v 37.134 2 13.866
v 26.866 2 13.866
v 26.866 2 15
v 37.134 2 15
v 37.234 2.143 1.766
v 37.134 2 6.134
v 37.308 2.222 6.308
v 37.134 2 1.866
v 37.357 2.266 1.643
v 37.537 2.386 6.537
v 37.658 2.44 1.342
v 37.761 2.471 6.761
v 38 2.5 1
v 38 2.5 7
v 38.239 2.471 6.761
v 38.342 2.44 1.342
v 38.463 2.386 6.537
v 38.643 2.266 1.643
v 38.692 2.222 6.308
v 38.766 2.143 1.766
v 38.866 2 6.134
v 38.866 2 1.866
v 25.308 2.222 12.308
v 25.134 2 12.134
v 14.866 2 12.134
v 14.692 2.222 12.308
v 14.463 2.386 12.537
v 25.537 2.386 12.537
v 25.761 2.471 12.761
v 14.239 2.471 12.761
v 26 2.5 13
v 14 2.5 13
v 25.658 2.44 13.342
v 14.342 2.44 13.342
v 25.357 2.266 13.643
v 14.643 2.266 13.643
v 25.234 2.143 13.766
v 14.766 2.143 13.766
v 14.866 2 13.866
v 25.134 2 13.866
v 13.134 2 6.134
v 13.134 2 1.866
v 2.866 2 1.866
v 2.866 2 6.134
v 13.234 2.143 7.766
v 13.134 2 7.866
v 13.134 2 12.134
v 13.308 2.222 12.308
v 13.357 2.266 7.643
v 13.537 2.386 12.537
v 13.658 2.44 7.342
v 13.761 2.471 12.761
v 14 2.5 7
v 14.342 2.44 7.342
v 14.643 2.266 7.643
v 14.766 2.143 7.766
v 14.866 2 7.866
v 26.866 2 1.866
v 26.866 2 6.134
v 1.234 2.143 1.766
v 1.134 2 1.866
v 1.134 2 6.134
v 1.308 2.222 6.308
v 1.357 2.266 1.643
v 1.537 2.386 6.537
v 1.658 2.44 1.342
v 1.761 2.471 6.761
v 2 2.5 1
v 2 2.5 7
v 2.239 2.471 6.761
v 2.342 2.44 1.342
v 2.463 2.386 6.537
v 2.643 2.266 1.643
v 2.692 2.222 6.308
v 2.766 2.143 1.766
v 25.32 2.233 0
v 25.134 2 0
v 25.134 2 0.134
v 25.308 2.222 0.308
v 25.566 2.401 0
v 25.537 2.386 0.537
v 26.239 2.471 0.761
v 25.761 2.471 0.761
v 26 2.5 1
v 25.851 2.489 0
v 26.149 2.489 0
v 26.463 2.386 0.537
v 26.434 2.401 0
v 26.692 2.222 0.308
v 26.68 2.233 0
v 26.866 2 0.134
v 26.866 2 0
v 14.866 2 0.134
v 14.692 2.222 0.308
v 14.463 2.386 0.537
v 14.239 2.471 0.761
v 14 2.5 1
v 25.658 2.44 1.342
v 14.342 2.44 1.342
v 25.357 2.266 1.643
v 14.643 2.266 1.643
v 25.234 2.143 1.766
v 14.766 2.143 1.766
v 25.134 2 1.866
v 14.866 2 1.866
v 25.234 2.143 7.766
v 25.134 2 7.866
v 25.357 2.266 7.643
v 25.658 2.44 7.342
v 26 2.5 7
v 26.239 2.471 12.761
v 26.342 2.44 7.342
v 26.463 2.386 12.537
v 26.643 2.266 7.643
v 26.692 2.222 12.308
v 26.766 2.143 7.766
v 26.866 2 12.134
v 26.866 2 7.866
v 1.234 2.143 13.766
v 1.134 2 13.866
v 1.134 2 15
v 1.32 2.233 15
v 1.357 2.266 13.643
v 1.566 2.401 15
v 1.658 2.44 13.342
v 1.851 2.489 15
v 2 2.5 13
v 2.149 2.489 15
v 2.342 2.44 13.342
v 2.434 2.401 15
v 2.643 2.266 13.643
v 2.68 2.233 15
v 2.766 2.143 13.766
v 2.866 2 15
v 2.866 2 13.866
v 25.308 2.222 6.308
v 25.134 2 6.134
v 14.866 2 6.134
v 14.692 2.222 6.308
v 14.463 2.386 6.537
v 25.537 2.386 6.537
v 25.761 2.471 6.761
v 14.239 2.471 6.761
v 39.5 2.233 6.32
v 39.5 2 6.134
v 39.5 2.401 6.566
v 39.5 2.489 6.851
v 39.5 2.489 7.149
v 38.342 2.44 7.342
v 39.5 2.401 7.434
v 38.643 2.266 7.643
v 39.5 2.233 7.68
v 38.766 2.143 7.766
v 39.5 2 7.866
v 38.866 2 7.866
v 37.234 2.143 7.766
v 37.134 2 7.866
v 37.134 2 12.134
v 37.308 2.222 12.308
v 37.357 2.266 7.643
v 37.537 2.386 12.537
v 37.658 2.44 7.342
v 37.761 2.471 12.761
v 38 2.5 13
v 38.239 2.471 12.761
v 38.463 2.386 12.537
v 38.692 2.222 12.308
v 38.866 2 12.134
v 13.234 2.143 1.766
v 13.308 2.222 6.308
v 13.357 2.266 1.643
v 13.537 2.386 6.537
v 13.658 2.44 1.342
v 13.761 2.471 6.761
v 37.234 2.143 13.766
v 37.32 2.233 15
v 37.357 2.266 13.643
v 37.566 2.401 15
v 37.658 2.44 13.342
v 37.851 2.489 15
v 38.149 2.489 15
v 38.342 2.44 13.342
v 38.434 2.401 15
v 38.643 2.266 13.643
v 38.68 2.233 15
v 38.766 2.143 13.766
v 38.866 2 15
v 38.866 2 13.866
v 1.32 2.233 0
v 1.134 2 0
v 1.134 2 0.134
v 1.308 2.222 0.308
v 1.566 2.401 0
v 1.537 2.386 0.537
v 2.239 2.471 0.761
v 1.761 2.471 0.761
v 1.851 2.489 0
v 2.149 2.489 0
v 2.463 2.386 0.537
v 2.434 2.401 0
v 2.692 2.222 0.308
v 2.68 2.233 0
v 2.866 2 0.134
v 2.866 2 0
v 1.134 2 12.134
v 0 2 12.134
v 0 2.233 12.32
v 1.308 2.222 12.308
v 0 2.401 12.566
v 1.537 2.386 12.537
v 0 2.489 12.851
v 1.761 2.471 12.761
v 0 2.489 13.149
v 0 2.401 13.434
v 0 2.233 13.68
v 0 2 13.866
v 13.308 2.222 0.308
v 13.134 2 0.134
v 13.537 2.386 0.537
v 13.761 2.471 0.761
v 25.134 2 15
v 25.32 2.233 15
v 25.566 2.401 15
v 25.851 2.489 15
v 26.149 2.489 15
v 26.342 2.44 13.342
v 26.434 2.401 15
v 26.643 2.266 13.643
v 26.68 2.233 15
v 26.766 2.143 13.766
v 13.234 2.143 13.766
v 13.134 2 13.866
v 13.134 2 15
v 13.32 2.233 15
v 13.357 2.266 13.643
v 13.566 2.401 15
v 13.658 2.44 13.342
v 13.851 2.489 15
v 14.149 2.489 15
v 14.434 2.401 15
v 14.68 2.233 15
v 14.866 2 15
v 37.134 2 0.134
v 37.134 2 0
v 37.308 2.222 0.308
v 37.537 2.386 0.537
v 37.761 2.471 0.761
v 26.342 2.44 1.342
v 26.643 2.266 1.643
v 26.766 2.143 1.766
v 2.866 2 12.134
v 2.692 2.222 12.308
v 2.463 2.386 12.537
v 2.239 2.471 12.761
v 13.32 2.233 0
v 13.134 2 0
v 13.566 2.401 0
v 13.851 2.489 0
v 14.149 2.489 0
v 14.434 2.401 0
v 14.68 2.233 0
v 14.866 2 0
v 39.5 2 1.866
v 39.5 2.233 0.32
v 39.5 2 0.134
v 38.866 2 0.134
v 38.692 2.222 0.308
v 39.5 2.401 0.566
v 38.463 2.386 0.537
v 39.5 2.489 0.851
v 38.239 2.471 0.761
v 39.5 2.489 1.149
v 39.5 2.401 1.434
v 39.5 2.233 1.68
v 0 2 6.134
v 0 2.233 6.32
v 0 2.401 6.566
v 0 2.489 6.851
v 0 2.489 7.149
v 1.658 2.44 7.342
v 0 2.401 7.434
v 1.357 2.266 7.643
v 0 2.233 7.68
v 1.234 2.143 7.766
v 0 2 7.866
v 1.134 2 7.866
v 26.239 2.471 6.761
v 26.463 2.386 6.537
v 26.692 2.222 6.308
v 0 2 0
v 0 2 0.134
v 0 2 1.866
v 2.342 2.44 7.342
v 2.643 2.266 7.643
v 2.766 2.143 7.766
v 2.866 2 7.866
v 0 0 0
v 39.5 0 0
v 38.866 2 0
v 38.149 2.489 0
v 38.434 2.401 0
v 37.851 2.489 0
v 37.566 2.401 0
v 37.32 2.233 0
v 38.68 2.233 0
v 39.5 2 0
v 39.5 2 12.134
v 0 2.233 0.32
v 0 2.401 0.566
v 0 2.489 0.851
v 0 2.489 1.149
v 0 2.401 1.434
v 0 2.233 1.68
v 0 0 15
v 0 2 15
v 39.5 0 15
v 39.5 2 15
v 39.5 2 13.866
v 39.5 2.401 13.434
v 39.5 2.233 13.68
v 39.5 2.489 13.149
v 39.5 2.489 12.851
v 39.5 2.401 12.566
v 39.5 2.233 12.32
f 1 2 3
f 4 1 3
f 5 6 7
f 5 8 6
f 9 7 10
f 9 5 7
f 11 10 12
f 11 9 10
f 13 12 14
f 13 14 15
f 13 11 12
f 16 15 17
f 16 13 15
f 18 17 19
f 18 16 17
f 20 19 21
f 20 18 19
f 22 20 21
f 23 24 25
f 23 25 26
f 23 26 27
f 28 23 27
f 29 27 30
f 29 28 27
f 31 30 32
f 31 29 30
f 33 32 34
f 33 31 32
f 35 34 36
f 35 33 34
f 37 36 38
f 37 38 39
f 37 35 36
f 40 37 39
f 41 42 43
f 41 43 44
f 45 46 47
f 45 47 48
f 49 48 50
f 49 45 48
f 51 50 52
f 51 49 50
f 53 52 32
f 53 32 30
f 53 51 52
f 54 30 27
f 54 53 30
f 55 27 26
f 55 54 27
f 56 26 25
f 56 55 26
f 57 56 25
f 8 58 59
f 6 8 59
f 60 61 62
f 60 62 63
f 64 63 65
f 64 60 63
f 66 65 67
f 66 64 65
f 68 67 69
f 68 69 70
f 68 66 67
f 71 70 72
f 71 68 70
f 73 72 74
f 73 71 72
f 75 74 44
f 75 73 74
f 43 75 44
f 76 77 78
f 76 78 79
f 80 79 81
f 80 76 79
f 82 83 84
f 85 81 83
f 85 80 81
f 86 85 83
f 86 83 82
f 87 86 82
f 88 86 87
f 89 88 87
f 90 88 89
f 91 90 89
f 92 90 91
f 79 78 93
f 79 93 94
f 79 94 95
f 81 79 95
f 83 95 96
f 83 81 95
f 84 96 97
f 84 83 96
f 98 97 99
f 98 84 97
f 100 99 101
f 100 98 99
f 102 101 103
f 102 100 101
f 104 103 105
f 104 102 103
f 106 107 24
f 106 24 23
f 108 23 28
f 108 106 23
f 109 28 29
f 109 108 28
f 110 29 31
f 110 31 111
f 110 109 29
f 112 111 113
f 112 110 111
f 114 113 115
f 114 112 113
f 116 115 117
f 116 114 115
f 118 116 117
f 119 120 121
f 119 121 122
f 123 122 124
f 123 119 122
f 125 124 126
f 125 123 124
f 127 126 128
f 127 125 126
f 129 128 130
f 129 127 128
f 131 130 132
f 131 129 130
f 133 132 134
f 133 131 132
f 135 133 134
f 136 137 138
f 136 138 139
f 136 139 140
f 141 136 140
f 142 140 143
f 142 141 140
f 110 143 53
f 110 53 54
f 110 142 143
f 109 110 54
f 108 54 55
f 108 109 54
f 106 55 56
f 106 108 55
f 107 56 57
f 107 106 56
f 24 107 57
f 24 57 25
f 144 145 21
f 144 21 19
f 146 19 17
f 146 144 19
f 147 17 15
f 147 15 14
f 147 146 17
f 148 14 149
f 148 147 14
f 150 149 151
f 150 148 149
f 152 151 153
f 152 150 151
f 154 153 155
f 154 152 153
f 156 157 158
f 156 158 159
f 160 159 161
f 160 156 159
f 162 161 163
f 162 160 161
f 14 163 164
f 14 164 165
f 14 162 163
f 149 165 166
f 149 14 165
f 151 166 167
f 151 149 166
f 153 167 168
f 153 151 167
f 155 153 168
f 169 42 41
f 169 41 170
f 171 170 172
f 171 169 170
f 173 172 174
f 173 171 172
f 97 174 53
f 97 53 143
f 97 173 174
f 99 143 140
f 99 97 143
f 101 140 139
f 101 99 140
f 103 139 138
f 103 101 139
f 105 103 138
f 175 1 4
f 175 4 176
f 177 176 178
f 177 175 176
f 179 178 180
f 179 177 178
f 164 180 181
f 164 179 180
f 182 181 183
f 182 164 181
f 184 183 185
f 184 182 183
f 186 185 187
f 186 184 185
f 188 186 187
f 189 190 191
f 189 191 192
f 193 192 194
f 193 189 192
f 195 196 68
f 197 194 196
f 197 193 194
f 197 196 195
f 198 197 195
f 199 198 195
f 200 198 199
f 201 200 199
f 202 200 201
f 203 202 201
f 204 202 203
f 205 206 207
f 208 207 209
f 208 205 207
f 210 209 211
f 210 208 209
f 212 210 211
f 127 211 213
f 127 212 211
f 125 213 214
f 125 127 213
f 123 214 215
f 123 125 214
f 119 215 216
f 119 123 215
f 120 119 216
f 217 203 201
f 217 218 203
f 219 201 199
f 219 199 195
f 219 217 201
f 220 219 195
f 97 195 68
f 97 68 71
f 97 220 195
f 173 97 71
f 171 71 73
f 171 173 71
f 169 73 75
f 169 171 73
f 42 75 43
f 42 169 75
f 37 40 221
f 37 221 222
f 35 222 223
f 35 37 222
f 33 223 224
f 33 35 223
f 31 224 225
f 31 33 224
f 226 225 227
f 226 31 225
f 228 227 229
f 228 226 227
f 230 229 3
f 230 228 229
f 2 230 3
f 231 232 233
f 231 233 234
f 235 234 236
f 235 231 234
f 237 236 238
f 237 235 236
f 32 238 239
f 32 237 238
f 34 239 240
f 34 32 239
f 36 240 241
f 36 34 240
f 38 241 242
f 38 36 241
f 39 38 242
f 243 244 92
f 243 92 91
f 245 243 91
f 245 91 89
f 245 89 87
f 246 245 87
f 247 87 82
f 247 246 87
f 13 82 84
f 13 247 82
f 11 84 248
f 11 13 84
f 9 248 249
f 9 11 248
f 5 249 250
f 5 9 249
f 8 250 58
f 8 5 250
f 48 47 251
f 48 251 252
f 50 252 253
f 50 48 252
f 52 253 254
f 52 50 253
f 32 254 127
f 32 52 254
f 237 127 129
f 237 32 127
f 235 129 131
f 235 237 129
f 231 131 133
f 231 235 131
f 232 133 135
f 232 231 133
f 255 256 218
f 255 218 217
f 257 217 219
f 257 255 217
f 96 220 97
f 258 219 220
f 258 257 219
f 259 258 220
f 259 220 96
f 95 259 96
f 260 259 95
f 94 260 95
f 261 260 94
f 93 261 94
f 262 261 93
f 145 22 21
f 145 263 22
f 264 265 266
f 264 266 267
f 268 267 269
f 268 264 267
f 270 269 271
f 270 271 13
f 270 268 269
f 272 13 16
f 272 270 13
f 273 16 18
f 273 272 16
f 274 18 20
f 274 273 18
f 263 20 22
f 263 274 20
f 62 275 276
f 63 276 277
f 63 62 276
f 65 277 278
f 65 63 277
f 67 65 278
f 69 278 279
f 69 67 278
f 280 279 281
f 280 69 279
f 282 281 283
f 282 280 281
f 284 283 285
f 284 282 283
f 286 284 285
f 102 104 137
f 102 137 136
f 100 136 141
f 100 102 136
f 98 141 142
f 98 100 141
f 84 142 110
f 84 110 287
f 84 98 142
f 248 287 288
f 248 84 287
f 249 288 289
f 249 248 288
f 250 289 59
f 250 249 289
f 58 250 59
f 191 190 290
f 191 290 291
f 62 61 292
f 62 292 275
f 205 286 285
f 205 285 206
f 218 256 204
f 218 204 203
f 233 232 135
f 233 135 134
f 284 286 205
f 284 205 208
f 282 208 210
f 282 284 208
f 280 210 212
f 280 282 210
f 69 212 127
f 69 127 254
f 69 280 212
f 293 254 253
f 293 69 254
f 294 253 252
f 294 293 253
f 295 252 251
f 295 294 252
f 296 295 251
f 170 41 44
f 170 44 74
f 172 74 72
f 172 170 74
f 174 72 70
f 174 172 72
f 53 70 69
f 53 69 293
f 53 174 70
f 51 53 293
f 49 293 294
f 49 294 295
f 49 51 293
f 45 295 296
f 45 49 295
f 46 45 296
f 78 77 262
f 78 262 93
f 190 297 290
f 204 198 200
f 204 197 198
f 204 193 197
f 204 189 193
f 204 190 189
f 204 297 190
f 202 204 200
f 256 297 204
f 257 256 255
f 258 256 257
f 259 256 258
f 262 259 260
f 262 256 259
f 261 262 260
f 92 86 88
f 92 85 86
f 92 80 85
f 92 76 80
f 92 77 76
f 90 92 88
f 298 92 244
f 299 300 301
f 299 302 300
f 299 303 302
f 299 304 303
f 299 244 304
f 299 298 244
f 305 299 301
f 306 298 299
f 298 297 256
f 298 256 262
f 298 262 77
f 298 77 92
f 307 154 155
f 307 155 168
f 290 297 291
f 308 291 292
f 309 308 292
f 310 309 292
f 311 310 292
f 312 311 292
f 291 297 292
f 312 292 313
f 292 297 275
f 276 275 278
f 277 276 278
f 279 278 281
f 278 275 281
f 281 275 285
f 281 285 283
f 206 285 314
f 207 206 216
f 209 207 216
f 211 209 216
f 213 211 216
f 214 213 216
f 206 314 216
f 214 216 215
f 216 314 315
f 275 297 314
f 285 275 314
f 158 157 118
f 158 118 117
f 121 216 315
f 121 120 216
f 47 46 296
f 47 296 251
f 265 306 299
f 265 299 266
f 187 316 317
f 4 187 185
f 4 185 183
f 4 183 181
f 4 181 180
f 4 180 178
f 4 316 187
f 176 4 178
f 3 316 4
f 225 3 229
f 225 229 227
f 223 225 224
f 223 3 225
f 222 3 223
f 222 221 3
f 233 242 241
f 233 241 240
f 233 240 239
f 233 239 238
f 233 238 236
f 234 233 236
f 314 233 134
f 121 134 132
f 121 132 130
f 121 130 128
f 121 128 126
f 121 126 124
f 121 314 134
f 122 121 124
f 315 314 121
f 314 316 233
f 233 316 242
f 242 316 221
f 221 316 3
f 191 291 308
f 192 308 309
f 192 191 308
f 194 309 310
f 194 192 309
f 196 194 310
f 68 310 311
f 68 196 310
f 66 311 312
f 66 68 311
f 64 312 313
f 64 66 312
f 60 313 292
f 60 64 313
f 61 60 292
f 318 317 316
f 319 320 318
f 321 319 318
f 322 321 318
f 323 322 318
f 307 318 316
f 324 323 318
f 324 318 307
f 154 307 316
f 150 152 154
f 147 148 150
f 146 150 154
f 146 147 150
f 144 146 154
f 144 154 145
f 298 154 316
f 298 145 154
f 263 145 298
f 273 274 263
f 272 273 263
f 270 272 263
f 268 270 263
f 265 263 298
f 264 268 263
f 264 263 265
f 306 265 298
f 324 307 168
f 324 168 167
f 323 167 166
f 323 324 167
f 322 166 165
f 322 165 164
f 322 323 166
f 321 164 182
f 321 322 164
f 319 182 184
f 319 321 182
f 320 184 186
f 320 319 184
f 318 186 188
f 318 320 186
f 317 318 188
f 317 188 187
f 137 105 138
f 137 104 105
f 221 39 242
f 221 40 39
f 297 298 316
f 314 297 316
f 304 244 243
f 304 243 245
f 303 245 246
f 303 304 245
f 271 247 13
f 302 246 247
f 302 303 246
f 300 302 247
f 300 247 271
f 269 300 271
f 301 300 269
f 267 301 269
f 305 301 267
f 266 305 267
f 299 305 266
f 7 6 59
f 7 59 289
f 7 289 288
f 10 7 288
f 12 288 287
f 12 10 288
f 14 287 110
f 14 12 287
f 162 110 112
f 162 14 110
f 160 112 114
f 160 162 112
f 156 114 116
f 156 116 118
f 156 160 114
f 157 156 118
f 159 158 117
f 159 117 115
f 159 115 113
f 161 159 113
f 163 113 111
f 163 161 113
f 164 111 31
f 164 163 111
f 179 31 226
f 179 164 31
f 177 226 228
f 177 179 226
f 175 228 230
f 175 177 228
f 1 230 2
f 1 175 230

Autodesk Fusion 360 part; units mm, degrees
box "BoxPrimitive1" add length 15 width 39.5 height 2 placed x (0, 0, 1) y (1, 0, 0) z (0, 1, 0) at (0, 0, 0)
sketch "Sketch2" plane through (0, 0, 0) normal (1, 0, 0) x (0, 0, -1)
cylinder "CylinderPrimitive1" add diameter 2 height 39.5 placed x (0, 0, -1) y (0, 1, 0) z (1, 0, 0) at (0, 1.5, 1)
cylinder "CylinderPrimitive2" add diameter 2 height -39.5 placed x (0, 0, -1) y (0, 1, 0) z (1, 0, 0) at (39.5, 1.5, 7)
cylinder "CylinderPrimitive3" add diameter 2 height -39.5 placed x (0, 0, -1) y (0, 1, 0) z (1, 0, 0) at (39.5, 1.5, 13)
cylinder "CylinderPrimitive4" add diameter 2 height -15 placed x (0, 1, 0) y (1, 0, 0) z (0, 0, -1) at (2, 1.5, 0)
cylinder "CylinderPrimitive6" add diameter 2 height -15 placed x (0, 1, 0) y (1, 0, 0) z (0, 0, -1) at (14, 1.5, 0)
cylinder "CylinderPrimitive8" add diameter 2 height -15 placed x (0, 1, 0) y (1, 0, 0) z (0, 0, -1) at (26, 1.5, 0)
cylinder "CylinderPrimitive10" add diameter 2 height -15 placed x (0, 1, 0) y (1, 0, 0) z (0, 0, -1) at (38, 1.5, 0)
